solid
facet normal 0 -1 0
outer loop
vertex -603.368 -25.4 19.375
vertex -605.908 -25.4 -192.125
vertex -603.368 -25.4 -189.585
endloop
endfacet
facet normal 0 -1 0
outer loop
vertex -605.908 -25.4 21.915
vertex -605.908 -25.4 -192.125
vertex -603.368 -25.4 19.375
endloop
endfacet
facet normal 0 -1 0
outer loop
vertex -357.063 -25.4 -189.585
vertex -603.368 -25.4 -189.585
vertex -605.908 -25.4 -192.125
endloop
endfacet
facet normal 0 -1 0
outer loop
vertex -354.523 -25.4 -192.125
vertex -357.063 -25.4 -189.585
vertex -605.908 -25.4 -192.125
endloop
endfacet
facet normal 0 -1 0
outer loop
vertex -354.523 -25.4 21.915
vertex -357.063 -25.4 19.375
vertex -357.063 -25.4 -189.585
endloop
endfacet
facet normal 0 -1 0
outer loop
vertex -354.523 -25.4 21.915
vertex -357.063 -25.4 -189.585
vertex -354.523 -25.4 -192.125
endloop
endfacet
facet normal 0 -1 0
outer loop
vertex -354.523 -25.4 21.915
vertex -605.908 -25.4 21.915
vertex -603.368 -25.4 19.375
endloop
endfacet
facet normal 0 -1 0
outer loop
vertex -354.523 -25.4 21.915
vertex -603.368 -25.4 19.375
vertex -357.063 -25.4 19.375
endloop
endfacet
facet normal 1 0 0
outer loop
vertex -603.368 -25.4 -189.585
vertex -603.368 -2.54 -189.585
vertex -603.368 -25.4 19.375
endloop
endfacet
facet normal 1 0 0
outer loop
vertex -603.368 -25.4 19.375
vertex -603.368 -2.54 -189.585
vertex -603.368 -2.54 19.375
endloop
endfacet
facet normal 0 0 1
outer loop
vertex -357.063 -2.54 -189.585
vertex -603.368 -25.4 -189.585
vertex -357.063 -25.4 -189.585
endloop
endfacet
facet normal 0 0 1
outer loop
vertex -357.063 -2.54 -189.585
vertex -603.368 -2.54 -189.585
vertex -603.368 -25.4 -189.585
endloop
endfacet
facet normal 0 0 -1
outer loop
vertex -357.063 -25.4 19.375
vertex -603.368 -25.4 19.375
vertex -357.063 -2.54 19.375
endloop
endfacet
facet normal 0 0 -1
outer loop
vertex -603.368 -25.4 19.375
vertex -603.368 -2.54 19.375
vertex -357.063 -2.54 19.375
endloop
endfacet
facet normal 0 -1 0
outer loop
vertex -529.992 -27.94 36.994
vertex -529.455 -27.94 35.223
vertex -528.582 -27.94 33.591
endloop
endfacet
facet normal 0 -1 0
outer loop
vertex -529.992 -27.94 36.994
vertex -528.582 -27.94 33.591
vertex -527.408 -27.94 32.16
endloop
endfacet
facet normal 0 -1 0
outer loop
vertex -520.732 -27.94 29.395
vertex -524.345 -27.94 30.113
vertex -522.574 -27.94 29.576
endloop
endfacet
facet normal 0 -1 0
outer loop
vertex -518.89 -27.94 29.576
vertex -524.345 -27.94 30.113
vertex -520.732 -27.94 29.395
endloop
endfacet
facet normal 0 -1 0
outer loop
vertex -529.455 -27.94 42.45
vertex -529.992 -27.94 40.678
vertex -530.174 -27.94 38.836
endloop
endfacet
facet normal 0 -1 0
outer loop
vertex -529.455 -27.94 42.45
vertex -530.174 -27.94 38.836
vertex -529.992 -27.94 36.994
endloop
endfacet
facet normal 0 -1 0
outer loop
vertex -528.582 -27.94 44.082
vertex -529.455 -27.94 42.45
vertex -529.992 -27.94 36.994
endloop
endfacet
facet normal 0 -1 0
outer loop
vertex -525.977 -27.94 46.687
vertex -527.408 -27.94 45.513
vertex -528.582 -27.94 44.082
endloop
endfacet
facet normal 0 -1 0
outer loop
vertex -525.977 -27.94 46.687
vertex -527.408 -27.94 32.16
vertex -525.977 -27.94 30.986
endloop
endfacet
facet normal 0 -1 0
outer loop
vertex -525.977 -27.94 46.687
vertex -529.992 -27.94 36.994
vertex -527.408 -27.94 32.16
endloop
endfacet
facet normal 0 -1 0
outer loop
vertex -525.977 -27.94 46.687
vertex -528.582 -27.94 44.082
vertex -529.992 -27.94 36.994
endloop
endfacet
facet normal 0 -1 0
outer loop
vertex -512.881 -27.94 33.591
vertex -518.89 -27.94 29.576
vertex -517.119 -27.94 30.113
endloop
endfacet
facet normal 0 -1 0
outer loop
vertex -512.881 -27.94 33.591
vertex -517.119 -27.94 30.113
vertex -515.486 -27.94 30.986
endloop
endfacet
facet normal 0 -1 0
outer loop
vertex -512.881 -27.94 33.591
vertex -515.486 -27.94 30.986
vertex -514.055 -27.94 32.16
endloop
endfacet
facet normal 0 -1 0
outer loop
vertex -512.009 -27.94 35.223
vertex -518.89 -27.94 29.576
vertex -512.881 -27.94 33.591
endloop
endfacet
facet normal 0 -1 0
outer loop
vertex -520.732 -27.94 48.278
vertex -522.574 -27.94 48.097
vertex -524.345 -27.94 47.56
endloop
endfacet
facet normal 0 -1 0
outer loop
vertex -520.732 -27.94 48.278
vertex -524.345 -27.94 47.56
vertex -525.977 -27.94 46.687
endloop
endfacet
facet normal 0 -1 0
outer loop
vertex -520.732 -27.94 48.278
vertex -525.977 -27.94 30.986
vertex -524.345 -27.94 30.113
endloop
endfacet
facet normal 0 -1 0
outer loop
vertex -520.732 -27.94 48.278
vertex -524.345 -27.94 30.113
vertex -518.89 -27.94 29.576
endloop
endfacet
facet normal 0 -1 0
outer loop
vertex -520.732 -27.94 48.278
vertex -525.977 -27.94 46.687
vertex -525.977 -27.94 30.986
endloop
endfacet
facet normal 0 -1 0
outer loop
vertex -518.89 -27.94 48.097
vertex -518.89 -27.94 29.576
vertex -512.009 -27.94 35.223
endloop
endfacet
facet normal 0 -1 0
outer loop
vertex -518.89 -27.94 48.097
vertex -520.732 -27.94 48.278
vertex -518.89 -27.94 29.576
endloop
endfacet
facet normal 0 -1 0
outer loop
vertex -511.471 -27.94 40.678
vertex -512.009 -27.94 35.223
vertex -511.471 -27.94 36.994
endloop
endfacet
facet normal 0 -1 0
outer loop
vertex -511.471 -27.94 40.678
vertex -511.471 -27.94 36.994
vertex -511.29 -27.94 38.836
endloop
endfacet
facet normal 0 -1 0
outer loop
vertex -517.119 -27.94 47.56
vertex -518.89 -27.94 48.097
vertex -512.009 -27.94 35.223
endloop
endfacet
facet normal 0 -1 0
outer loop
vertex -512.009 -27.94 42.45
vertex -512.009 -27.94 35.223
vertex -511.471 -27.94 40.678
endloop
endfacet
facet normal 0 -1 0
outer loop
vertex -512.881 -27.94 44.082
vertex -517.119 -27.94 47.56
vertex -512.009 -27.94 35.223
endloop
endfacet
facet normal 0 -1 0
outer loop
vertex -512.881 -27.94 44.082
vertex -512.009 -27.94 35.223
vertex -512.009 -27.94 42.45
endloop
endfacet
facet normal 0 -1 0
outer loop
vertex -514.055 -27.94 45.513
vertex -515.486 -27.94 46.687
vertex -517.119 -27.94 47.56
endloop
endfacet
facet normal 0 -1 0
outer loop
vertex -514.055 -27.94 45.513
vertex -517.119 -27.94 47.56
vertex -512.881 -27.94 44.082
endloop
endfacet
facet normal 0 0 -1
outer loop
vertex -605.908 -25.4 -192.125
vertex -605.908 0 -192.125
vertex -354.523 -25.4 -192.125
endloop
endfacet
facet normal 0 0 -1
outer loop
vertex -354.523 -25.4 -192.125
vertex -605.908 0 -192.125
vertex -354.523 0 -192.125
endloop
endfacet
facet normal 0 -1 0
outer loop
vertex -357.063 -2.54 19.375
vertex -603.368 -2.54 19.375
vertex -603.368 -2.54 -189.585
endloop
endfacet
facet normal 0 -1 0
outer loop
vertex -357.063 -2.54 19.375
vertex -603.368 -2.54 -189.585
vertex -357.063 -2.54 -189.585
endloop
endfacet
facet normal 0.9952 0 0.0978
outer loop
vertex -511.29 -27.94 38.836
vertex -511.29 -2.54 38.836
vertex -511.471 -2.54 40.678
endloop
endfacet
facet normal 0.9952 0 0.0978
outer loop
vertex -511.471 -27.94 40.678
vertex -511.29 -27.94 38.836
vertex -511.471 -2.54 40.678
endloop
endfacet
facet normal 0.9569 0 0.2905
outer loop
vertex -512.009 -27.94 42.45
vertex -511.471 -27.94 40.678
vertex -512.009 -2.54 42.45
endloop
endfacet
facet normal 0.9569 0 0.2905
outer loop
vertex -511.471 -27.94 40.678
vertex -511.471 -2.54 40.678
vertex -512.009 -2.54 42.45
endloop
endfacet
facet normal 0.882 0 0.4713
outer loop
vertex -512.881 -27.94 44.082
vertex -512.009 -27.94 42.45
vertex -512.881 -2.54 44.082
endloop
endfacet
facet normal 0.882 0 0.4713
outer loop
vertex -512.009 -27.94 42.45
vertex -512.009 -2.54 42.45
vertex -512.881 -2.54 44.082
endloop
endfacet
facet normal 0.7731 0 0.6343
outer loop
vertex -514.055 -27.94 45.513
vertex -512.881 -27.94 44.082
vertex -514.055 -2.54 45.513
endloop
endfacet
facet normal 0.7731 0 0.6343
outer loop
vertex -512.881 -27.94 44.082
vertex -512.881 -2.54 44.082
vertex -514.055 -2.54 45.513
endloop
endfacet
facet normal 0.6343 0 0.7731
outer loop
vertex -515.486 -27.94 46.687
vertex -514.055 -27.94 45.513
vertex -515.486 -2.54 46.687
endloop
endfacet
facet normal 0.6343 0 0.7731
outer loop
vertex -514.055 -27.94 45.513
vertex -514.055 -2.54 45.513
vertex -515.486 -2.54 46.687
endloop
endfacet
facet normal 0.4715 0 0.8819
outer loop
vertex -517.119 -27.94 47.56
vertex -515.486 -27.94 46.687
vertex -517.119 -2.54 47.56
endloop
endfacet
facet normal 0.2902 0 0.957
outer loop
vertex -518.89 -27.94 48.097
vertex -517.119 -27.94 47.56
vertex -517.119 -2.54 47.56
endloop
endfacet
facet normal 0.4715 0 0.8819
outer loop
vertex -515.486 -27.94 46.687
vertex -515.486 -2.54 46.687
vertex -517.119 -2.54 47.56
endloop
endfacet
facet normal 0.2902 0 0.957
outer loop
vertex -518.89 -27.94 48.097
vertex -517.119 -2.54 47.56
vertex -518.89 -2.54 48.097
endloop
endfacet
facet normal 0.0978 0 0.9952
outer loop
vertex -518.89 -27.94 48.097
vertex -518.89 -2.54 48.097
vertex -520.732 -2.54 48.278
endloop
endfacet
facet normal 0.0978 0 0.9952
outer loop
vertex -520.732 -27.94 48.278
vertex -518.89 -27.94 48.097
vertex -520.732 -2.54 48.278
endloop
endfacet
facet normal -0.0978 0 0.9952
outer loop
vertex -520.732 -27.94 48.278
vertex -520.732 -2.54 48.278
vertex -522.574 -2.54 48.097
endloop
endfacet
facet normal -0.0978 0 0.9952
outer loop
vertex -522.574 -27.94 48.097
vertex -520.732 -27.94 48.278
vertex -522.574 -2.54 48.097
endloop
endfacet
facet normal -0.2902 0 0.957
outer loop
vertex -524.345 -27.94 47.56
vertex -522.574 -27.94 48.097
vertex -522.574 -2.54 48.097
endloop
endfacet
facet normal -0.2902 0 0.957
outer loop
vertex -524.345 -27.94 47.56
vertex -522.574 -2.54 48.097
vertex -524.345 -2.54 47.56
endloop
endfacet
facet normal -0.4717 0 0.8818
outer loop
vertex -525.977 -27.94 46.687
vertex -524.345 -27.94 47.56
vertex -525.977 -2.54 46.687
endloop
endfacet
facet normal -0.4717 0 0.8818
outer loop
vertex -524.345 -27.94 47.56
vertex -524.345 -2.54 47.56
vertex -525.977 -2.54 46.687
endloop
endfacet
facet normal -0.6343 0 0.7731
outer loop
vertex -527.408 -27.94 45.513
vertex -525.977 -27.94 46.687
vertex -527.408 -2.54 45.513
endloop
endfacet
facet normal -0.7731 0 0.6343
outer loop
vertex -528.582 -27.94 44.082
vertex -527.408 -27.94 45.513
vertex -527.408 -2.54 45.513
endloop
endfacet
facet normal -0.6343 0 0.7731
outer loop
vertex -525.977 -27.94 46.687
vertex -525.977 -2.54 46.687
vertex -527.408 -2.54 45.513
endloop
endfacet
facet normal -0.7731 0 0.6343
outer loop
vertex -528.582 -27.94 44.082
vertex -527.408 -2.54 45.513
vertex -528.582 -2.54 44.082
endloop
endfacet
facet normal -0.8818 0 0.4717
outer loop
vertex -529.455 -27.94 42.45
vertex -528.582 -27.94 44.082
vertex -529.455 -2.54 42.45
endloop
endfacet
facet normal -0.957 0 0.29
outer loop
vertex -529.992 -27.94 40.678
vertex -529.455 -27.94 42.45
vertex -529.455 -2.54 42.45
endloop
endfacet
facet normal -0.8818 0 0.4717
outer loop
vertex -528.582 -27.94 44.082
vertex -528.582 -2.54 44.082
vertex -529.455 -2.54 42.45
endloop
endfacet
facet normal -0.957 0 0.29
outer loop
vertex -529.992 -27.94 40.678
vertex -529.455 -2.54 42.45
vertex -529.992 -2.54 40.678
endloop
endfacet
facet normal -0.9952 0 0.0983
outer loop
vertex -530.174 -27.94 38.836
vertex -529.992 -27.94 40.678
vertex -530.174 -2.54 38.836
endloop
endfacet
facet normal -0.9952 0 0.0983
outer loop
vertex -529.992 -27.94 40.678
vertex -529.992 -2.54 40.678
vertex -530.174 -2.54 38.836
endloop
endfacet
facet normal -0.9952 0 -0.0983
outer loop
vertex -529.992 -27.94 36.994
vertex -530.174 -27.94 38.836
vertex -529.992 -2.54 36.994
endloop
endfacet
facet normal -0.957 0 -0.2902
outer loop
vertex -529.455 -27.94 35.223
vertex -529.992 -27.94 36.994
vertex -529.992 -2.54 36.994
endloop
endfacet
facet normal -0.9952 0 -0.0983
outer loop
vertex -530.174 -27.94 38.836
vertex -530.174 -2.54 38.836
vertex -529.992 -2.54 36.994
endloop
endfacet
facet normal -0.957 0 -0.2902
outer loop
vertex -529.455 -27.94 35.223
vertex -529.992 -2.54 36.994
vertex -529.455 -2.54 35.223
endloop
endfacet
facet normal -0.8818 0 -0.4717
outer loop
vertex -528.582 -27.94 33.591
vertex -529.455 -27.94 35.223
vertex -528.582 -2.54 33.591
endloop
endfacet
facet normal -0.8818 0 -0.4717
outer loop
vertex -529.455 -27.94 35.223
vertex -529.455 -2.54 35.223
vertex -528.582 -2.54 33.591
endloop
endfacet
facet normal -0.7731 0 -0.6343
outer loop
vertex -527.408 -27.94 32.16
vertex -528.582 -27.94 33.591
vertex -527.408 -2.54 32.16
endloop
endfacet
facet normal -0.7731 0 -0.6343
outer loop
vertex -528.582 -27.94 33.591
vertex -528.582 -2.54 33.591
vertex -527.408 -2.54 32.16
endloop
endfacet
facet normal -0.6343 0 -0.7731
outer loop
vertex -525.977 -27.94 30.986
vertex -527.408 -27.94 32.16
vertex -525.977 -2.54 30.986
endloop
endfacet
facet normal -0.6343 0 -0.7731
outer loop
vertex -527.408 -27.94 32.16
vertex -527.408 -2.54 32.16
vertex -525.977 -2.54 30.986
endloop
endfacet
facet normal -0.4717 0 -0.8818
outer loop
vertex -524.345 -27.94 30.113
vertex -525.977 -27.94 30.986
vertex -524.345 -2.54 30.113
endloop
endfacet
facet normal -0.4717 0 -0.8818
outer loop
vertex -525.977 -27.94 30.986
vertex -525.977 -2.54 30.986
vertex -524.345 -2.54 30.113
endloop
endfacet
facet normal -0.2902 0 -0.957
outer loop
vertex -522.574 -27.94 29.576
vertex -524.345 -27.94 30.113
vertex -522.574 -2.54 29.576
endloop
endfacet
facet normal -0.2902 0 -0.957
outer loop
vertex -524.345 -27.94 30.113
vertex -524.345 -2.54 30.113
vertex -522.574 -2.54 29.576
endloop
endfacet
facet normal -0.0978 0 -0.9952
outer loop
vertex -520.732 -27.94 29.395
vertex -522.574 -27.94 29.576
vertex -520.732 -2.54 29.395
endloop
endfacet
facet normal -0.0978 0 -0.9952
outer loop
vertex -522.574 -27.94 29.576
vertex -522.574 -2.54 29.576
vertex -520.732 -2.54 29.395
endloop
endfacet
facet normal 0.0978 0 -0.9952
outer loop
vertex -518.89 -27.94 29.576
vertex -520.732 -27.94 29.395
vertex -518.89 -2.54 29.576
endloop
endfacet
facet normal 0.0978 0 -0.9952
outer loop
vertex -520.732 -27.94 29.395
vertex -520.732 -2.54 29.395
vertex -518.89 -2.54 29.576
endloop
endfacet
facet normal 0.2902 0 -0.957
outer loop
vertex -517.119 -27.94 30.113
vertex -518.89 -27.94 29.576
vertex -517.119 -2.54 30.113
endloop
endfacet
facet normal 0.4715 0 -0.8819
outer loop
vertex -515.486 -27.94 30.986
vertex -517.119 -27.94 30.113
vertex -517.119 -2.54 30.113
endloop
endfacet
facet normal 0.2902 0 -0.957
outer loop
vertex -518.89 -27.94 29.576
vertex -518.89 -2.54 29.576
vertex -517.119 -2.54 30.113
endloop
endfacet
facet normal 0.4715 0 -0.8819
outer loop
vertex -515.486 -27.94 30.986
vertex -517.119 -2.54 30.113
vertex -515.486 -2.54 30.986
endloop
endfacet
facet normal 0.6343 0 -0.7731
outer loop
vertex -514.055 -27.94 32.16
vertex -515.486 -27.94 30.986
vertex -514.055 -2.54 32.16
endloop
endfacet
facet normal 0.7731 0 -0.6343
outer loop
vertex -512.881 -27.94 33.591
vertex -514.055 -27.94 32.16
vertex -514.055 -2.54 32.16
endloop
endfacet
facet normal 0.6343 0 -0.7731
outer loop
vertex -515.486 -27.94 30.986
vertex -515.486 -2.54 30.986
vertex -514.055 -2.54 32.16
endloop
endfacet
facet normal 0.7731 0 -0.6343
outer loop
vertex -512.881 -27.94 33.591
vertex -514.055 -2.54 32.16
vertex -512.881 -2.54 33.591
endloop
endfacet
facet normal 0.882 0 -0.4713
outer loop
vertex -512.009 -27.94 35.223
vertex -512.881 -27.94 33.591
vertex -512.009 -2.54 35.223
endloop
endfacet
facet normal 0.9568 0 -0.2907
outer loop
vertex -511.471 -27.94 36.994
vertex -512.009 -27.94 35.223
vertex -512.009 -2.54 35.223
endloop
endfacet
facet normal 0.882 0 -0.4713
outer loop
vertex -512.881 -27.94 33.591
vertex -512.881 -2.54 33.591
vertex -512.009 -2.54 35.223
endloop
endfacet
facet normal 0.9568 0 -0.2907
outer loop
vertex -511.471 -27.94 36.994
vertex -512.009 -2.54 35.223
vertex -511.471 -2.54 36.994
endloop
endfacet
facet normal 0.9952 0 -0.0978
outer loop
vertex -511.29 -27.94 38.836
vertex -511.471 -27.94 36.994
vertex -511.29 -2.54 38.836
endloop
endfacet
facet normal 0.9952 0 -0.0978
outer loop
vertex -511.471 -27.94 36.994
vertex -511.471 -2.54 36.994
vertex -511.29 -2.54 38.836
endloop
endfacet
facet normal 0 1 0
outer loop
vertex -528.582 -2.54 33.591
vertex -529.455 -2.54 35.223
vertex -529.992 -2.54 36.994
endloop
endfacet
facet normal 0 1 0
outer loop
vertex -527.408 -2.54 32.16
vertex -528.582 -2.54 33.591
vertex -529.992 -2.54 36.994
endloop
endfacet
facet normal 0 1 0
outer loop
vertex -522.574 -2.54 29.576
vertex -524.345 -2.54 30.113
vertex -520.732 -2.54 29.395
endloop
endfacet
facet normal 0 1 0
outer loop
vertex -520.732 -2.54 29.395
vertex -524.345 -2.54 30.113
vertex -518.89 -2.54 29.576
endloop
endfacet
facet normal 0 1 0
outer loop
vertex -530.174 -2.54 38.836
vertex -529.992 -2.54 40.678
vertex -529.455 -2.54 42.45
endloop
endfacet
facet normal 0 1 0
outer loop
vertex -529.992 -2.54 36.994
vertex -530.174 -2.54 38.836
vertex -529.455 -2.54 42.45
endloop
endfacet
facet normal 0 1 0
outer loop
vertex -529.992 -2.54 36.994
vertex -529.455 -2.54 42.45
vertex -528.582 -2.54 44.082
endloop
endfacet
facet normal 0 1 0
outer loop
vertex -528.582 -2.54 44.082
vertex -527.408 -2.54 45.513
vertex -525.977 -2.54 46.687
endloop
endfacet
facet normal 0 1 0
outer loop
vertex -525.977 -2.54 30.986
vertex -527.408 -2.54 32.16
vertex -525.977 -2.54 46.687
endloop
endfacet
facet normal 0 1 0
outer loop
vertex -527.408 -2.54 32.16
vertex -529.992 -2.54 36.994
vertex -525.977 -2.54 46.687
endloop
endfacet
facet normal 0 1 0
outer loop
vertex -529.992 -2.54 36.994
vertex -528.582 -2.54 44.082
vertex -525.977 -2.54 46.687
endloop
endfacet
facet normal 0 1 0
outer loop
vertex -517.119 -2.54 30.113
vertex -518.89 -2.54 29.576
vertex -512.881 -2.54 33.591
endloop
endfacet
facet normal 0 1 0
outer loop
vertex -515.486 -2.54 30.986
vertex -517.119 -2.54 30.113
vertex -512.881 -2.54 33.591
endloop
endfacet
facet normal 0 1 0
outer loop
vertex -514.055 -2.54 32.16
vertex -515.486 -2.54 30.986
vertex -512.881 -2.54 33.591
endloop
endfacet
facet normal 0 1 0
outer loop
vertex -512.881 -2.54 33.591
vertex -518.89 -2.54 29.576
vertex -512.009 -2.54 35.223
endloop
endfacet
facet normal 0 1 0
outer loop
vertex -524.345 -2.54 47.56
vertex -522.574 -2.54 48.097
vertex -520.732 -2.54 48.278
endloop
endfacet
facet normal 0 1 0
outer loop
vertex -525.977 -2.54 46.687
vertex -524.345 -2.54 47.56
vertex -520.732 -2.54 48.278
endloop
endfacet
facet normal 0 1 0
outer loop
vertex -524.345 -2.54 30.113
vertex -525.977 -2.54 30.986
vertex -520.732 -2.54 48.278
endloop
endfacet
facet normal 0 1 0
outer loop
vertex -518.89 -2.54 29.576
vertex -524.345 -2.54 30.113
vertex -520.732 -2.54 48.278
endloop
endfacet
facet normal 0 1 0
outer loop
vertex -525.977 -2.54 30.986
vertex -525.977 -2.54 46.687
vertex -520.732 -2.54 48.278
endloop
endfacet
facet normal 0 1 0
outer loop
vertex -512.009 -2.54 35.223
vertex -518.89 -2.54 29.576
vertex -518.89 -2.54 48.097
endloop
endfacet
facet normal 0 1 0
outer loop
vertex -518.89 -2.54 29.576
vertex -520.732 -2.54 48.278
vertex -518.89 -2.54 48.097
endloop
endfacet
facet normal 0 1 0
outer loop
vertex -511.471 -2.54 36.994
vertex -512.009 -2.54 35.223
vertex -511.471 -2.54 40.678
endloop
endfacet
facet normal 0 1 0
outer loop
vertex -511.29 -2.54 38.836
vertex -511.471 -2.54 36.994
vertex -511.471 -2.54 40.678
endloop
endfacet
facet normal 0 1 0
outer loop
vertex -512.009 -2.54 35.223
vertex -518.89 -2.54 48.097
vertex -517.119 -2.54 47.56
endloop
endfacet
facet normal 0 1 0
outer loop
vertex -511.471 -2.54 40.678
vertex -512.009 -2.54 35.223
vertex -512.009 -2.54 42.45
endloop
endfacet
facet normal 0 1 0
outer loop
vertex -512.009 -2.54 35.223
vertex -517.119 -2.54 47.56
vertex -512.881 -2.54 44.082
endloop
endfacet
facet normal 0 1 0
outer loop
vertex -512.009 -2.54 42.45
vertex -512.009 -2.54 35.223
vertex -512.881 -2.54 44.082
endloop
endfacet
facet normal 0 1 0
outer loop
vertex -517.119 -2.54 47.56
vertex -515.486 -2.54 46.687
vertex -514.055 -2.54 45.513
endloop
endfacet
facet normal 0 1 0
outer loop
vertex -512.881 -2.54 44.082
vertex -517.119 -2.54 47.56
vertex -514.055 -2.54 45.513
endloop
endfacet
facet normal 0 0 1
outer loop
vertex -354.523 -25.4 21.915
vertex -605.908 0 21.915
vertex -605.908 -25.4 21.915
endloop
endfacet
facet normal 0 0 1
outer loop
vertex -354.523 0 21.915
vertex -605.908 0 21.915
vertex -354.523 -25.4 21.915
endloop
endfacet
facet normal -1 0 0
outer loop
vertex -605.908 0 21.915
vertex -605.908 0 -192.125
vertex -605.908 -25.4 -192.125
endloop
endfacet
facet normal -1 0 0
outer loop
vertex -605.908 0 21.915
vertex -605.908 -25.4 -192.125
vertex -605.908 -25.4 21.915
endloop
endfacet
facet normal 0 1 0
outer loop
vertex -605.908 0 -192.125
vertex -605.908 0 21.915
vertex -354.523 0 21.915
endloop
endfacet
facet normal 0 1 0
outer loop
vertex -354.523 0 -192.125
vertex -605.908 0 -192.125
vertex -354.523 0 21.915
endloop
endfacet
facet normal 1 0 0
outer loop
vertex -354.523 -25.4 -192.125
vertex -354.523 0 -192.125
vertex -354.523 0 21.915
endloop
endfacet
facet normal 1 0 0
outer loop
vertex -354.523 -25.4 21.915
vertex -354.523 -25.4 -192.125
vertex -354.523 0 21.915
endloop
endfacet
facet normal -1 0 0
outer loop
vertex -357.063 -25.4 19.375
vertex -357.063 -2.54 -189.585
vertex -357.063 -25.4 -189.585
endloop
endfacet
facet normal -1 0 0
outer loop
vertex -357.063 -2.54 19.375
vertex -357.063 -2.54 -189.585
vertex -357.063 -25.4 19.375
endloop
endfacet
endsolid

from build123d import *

# Parameters (mm, degrees)
F0_W     = 251.3852417469
F0_H     = 214.0397690237
F2_DEPTH = 25.4
F3_T     = -2.54
F4_R     = 9.4419076599
F5_DEPTH = 25.4


# Not quite as in the source:
# - the program builds the solid bodies; features that only make, move or delete a surface that nothing else refers to are left out


with BuildPart() as f2:
    # F0 (on Front) → F2 (new body)
    with BuildSketch(Plane.XZ):
        with Locations((-480.2153557539, -85.1046163589)):
            Rectangle(F0_W, F0_H)
    extrude(amount=F2_DEPTH)

    # F3
    f3_openings = [f2.faces().sort_by_distance(p)[0] for p in [
        (-480.215356, -25.4, -85.104616),
    ]]
    offset(amount=F3_T, openings=f3_openings)


with BuildPart() as f5:
    # F4 (on face) → F5 (new body)
    with BuildSketch(Plane.XZ.offset(2.54)):
        with Locations((-520.7318067551, 38.8364158571)):
            Circle(F4_R)
    extrude(amount=F5_DEPTH)


solid = Compound([f2.part, f5.part])
